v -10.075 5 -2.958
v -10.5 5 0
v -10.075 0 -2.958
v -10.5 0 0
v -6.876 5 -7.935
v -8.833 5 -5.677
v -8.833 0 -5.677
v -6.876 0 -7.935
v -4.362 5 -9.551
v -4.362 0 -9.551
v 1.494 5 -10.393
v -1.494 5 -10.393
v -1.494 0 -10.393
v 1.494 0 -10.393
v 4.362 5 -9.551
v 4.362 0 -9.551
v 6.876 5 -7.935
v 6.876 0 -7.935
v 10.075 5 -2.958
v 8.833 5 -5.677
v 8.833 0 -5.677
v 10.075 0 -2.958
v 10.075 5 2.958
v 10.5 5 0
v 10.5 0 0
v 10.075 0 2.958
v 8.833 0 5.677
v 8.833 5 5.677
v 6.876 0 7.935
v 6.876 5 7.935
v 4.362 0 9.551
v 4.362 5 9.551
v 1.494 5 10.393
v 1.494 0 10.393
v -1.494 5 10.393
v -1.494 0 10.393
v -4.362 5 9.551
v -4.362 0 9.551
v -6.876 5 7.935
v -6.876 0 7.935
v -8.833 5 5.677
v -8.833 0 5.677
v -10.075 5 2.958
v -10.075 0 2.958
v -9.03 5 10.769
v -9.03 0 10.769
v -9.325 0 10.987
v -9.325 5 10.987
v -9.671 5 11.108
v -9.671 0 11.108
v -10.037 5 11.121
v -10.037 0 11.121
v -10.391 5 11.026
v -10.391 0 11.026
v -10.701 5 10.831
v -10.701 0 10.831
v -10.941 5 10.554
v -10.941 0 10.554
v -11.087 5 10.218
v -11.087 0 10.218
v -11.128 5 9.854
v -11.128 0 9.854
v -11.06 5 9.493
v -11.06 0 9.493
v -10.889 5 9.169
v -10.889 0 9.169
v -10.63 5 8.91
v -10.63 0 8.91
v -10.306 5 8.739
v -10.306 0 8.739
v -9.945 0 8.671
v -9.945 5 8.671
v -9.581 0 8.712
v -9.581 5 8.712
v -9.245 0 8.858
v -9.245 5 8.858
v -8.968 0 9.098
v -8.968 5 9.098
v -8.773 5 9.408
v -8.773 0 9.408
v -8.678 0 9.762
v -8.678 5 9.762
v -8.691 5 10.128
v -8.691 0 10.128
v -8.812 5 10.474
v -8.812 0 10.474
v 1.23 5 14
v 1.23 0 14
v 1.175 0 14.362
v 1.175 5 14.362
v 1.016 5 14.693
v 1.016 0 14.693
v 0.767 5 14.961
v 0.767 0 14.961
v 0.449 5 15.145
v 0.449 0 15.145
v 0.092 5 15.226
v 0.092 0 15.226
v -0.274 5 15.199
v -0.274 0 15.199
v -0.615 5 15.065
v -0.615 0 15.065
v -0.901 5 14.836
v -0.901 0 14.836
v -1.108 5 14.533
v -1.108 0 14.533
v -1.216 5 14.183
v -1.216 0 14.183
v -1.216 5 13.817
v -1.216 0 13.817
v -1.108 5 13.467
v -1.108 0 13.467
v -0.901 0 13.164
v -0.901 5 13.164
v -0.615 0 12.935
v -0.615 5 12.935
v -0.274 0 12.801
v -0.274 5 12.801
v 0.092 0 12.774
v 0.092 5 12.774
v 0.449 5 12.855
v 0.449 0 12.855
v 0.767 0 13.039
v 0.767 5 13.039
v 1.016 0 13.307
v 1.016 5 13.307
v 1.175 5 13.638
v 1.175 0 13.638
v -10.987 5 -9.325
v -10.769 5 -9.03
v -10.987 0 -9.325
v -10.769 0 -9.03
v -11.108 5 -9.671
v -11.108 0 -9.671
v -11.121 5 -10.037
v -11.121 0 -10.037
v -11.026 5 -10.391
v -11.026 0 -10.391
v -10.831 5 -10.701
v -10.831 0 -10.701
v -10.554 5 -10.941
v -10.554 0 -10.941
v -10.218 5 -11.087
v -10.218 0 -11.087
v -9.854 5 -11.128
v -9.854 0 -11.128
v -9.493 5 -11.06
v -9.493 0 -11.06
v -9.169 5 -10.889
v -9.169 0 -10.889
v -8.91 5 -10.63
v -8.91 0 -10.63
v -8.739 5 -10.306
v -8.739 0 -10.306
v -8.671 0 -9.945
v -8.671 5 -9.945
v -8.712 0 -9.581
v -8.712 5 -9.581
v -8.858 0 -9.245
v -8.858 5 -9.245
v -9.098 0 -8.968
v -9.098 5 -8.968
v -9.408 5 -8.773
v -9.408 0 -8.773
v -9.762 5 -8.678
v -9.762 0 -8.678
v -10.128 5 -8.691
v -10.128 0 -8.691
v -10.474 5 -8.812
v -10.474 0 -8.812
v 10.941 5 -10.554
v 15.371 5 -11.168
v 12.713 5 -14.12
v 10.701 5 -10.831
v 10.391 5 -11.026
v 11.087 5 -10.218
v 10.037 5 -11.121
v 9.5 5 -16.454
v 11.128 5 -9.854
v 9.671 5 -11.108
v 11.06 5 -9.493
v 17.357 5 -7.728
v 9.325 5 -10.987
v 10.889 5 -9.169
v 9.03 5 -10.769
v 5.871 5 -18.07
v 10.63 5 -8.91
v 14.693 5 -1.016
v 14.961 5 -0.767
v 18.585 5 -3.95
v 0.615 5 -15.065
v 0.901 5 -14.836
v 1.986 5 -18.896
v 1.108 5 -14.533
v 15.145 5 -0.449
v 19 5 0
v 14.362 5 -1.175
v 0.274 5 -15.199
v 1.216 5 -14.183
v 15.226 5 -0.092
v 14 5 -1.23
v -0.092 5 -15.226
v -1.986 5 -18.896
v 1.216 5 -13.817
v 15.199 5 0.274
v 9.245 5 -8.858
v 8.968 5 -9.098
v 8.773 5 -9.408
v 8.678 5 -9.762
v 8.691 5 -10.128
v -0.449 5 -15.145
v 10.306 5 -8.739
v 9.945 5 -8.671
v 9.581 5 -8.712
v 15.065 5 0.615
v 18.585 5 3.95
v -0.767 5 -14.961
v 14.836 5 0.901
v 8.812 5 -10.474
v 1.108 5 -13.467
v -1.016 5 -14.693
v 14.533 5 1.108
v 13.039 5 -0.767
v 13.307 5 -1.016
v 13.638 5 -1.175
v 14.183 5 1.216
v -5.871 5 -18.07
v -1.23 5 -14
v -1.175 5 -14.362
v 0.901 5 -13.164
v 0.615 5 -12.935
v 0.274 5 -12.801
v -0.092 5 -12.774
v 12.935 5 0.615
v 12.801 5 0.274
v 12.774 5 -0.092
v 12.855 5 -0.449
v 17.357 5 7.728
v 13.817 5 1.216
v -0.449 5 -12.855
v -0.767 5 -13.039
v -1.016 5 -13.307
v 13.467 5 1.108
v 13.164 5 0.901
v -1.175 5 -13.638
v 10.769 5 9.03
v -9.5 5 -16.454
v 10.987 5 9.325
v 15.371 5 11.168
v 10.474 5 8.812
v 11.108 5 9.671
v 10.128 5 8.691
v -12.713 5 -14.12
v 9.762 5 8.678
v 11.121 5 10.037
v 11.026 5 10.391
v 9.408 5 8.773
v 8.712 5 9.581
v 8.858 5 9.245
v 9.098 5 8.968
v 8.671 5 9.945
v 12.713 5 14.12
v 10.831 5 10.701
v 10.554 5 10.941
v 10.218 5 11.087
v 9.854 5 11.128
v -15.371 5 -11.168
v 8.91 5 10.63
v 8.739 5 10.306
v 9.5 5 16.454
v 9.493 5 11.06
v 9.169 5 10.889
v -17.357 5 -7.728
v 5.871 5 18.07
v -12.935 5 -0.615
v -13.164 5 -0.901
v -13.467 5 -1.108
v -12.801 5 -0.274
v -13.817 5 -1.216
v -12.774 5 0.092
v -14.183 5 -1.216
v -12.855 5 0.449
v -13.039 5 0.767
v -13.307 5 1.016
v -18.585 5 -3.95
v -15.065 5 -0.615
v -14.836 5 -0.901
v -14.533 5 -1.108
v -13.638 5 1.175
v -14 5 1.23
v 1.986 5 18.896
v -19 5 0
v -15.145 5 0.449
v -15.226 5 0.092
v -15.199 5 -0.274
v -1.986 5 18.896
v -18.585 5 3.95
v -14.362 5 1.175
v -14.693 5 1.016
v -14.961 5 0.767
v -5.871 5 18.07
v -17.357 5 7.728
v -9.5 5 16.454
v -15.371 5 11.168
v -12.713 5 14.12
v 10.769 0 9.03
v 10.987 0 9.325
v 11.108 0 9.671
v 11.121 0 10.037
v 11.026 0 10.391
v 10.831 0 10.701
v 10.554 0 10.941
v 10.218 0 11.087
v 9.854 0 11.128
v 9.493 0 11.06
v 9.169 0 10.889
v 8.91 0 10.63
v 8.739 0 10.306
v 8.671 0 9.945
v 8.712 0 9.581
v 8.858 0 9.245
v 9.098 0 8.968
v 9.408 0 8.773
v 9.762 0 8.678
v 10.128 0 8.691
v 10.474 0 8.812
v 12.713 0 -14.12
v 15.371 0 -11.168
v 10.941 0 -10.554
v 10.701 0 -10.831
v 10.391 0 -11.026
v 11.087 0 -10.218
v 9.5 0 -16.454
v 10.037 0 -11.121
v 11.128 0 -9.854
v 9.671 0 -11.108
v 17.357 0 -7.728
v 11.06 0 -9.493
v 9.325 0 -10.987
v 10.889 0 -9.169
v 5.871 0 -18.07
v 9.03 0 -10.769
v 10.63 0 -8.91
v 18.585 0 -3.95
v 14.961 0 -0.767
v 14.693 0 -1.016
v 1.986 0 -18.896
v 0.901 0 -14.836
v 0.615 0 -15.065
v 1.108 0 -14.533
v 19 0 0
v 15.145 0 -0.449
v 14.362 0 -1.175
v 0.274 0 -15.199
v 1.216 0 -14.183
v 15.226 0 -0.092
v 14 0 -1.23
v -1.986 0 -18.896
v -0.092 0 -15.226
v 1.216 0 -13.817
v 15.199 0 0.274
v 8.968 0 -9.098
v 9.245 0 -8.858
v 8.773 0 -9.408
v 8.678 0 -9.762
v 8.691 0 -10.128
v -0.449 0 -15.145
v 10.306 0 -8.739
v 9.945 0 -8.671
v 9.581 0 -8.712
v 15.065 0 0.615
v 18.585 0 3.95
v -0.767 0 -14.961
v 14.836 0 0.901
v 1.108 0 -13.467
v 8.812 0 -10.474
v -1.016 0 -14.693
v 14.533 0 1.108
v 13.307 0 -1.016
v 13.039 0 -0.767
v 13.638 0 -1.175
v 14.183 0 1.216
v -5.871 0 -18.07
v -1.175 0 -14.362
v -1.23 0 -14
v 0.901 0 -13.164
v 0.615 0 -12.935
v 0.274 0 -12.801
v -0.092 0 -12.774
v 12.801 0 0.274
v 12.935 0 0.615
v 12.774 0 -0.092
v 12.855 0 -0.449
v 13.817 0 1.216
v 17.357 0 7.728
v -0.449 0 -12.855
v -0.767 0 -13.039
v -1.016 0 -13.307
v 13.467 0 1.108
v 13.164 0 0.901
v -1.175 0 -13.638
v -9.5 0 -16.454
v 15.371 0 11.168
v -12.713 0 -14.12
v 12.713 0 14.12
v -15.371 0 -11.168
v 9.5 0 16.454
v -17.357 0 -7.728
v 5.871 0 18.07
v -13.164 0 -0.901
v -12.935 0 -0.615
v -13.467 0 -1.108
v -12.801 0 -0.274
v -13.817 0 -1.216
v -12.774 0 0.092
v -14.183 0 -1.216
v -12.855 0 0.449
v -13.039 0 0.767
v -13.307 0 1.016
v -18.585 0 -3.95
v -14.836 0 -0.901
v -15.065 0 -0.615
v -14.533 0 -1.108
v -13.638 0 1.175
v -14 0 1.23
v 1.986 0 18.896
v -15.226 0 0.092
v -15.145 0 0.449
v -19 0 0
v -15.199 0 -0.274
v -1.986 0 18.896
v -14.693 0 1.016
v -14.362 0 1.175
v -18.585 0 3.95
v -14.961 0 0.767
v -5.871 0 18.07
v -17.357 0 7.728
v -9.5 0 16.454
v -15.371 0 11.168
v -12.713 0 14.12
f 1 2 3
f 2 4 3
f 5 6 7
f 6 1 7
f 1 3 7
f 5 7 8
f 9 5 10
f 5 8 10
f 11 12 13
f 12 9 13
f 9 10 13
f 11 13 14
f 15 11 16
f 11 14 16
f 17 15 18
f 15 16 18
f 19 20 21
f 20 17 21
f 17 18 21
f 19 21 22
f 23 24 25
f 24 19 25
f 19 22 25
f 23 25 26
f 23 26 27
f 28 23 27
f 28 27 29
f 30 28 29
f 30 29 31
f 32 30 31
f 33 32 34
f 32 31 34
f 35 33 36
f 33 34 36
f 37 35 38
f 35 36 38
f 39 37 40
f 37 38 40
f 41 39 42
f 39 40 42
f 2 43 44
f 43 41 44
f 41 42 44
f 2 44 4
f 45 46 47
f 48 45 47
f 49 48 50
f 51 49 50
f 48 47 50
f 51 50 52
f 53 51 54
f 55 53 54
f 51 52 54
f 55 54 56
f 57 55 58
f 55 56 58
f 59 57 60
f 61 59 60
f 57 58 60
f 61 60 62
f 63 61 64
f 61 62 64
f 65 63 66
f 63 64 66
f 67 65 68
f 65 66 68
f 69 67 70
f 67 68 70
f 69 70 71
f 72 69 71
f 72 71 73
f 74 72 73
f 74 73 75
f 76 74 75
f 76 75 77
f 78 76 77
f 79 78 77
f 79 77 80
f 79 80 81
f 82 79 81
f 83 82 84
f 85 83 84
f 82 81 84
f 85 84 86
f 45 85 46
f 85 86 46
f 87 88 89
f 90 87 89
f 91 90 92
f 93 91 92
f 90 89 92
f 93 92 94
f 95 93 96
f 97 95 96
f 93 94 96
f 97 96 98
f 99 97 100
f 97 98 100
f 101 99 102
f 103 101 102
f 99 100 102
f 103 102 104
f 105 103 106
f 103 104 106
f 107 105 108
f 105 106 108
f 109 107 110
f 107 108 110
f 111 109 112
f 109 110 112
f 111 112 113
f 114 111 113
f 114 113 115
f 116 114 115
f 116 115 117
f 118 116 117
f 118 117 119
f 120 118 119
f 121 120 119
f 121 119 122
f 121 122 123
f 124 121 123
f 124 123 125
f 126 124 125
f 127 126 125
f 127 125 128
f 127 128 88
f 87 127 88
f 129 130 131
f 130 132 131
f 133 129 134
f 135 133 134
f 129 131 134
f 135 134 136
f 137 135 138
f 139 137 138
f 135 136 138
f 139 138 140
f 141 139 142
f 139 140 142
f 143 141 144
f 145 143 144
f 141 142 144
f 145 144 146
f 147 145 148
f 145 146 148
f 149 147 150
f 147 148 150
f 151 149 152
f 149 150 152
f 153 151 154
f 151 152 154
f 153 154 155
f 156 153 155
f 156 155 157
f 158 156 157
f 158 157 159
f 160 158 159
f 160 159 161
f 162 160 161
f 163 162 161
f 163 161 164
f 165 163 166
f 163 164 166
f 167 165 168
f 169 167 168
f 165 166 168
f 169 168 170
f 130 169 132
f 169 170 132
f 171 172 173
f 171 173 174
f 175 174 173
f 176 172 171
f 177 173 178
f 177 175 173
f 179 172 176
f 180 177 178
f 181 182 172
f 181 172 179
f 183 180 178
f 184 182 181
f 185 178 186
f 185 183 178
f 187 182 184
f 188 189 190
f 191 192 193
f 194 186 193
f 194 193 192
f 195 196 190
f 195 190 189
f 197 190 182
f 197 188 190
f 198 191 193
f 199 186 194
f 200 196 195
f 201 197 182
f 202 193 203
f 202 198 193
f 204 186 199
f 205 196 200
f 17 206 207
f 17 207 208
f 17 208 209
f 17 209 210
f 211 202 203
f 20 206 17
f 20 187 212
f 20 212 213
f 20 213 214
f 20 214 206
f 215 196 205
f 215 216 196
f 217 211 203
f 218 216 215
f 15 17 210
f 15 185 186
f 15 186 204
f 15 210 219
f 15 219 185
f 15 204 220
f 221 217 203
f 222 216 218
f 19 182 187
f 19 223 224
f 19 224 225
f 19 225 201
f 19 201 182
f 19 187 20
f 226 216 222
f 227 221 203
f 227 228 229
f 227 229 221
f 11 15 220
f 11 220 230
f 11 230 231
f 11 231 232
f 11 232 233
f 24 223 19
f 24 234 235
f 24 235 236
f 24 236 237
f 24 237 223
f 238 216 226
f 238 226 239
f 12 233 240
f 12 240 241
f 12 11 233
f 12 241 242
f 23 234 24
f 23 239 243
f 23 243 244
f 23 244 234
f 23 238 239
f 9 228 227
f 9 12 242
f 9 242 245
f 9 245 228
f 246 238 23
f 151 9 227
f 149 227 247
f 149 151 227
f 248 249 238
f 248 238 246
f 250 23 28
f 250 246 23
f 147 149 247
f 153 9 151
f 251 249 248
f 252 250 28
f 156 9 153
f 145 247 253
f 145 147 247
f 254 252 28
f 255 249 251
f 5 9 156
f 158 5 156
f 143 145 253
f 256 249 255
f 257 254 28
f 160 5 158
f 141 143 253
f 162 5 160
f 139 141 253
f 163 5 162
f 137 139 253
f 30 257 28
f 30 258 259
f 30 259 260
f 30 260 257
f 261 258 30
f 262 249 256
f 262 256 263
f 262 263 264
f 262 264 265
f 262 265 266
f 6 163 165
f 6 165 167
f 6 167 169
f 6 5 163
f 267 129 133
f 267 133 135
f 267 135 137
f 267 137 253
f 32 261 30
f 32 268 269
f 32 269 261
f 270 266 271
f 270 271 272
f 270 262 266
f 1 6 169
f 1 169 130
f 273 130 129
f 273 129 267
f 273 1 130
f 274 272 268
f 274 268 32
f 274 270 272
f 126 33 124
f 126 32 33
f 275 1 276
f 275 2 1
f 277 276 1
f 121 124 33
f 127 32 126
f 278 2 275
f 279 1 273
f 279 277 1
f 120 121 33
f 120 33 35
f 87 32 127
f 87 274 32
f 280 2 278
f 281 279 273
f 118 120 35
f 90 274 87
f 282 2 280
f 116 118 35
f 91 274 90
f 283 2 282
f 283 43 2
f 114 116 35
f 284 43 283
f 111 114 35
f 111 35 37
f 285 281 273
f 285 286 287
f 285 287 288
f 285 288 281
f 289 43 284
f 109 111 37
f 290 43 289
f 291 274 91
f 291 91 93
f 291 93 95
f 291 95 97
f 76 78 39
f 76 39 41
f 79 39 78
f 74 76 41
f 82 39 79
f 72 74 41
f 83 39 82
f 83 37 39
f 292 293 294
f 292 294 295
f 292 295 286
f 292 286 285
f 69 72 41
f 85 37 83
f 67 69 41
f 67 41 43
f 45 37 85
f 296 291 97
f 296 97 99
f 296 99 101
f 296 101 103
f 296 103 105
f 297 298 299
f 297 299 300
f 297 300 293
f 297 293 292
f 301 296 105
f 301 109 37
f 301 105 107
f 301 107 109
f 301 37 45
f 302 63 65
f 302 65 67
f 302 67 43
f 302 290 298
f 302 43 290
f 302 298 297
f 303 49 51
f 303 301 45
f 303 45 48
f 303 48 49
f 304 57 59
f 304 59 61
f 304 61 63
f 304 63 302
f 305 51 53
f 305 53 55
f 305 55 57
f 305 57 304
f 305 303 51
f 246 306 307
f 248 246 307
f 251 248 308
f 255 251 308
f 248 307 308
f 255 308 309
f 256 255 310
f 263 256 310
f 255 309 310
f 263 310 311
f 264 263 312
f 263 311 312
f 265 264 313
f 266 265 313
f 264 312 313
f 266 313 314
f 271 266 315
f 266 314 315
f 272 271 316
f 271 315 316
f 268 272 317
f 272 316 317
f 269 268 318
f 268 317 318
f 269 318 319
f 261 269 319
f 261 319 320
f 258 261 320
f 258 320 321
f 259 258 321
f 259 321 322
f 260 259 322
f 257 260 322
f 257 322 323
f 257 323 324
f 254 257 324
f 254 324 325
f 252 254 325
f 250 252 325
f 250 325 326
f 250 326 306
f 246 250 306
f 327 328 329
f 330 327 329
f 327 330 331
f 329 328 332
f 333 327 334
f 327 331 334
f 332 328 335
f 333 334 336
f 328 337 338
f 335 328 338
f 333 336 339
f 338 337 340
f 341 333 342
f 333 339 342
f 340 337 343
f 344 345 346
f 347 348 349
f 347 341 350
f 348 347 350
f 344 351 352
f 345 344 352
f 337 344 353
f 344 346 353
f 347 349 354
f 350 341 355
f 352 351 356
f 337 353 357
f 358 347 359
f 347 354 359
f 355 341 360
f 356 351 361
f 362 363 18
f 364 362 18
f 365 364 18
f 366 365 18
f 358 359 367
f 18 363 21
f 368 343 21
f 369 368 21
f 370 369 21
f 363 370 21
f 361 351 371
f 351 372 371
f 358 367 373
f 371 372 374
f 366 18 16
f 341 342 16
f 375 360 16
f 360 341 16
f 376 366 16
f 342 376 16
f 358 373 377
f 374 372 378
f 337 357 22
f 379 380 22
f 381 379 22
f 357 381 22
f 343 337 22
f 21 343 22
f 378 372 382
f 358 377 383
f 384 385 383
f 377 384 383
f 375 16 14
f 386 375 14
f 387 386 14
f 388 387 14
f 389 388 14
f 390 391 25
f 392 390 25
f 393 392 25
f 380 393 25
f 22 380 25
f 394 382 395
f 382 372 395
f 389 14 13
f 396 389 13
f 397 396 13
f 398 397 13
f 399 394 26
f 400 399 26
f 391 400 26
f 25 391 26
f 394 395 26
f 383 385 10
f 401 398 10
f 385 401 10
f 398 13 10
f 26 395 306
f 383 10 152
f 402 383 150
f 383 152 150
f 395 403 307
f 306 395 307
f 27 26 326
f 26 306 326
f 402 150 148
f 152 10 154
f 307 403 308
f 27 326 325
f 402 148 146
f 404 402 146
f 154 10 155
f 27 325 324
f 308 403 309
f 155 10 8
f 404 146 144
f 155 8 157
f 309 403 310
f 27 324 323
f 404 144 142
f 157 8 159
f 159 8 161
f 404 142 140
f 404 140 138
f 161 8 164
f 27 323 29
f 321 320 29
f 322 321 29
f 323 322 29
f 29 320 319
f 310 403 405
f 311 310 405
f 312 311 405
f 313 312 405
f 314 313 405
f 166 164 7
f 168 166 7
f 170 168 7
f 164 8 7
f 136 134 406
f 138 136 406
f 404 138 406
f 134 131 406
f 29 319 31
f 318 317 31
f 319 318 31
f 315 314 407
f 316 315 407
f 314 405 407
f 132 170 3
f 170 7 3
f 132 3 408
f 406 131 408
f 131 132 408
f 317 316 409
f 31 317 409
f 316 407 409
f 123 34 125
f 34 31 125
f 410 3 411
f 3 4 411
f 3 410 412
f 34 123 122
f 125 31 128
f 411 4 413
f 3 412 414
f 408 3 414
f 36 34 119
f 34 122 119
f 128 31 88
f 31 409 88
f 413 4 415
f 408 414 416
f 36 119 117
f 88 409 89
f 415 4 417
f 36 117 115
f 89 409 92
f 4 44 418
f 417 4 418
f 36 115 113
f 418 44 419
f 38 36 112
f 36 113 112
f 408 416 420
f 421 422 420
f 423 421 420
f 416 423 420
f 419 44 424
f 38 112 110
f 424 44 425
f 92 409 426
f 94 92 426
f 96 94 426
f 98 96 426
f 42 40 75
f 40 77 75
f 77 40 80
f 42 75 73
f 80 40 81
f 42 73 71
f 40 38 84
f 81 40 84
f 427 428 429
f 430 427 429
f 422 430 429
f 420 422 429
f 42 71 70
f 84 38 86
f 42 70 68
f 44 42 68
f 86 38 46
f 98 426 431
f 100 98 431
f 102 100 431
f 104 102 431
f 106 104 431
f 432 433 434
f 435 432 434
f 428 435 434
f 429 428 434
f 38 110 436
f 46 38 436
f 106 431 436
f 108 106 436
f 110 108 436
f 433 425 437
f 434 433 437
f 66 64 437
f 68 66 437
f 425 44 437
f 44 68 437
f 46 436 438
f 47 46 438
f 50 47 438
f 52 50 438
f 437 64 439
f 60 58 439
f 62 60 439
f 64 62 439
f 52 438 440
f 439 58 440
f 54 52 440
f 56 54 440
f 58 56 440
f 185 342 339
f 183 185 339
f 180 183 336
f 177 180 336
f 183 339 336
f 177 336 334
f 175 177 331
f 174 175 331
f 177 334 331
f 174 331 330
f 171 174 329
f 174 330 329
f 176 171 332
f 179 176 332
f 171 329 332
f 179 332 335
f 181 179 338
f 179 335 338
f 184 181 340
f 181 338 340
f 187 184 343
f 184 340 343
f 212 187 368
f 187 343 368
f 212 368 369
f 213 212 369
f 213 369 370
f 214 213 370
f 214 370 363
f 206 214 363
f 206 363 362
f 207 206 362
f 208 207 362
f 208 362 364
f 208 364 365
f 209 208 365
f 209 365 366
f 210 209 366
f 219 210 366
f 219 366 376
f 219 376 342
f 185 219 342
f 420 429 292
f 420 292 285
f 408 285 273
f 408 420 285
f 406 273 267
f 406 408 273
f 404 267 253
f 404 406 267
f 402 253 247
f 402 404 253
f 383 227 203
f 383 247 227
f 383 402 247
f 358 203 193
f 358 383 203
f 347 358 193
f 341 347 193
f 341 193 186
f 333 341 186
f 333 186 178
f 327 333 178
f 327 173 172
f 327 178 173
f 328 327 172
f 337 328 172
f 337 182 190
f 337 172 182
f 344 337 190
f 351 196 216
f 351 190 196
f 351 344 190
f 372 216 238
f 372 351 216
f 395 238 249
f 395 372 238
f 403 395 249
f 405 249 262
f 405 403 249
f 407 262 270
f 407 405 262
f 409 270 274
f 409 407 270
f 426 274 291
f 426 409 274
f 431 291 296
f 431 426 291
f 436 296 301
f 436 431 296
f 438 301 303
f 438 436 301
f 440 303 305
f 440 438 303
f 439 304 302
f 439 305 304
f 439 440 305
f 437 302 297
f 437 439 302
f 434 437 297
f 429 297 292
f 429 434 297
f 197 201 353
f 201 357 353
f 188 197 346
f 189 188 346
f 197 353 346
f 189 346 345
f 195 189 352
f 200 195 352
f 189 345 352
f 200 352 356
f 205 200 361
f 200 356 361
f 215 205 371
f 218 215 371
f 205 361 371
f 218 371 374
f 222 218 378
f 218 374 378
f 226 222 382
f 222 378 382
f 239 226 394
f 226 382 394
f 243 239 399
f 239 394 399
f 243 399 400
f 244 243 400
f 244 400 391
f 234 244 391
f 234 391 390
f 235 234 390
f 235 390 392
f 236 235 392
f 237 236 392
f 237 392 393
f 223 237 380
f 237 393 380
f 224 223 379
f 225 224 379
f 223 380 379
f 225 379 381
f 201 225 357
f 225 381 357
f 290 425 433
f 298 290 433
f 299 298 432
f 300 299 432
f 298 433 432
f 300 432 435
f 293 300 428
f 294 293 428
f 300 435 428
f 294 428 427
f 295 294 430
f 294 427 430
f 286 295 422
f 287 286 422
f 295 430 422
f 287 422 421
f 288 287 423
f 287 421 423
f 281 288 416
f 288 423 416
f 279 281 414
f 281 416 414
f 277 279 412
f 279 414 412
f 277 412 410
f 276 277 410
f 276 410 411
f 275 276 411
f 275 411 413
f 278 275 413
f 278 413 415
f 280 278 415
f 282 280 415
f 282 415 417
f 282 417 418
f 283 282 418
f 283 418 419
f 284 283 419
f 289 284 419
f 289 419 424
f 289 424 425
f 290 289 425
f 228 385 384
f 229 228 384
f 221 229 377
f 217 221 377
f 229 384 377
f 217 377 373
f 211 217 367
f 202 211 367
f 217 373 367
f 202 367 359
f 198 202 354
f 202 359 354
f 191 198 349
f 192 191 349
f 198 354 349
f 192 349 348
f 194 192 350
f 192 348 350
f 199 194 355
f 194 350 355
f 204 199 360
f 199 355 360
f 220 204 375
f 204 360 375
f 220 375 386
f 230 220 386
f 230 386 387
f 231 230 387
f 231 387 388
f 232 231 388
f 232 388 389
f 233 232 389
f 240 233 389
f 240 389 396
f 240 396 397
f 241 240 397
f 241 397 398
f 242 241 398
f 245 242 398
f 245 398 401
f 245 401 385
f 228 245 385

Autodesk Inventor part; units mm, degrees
ref_plane "YZ Plane" through (0, 0, 0) normal (1, 0, 0) x (0, 1, 0)
ref_plane "XZ Plane" through (0, 0, 0) normal (0, 1, 0) x (-1, 0, 0)
ref_plane "XY Plane" through (0, 0, 0) normal (0, 0, 1) x (1, 0, 0)
sketch "Sketch1" plane through (0, 0, 0) normal (0, 1, 0) x (-1, 0, 0)
  circle A0 centre (0, 0) radius 19
  circle A1 centre (0, 0) radius 10.5
  dimension "d0" = 38
  dimension "d1" = 21
extrude "Extrusion1" add sketch "Sketch1" along normal blind 5
sketch "Sketch2" plane through (0, 5, 0) normal (0, 1, 0) x (1, 0, 0)
  circle A0 centre (0, 0) radius 14 construction
  point P0 (-14, 0)
  dimension "d4" = 28
hole "Hole1" at (-14, 5, 0) direction (0, -1, 0) diameter 2.459 depth 5 thread size "M3x0.5" class "6H" standard "ISO Metric profile"
pattern_circular "Circular Pattern1" count 8 over 360 about axis through (0, 0, 0) along (0, 1, 0) of "Hole1"
properties part number "212"
